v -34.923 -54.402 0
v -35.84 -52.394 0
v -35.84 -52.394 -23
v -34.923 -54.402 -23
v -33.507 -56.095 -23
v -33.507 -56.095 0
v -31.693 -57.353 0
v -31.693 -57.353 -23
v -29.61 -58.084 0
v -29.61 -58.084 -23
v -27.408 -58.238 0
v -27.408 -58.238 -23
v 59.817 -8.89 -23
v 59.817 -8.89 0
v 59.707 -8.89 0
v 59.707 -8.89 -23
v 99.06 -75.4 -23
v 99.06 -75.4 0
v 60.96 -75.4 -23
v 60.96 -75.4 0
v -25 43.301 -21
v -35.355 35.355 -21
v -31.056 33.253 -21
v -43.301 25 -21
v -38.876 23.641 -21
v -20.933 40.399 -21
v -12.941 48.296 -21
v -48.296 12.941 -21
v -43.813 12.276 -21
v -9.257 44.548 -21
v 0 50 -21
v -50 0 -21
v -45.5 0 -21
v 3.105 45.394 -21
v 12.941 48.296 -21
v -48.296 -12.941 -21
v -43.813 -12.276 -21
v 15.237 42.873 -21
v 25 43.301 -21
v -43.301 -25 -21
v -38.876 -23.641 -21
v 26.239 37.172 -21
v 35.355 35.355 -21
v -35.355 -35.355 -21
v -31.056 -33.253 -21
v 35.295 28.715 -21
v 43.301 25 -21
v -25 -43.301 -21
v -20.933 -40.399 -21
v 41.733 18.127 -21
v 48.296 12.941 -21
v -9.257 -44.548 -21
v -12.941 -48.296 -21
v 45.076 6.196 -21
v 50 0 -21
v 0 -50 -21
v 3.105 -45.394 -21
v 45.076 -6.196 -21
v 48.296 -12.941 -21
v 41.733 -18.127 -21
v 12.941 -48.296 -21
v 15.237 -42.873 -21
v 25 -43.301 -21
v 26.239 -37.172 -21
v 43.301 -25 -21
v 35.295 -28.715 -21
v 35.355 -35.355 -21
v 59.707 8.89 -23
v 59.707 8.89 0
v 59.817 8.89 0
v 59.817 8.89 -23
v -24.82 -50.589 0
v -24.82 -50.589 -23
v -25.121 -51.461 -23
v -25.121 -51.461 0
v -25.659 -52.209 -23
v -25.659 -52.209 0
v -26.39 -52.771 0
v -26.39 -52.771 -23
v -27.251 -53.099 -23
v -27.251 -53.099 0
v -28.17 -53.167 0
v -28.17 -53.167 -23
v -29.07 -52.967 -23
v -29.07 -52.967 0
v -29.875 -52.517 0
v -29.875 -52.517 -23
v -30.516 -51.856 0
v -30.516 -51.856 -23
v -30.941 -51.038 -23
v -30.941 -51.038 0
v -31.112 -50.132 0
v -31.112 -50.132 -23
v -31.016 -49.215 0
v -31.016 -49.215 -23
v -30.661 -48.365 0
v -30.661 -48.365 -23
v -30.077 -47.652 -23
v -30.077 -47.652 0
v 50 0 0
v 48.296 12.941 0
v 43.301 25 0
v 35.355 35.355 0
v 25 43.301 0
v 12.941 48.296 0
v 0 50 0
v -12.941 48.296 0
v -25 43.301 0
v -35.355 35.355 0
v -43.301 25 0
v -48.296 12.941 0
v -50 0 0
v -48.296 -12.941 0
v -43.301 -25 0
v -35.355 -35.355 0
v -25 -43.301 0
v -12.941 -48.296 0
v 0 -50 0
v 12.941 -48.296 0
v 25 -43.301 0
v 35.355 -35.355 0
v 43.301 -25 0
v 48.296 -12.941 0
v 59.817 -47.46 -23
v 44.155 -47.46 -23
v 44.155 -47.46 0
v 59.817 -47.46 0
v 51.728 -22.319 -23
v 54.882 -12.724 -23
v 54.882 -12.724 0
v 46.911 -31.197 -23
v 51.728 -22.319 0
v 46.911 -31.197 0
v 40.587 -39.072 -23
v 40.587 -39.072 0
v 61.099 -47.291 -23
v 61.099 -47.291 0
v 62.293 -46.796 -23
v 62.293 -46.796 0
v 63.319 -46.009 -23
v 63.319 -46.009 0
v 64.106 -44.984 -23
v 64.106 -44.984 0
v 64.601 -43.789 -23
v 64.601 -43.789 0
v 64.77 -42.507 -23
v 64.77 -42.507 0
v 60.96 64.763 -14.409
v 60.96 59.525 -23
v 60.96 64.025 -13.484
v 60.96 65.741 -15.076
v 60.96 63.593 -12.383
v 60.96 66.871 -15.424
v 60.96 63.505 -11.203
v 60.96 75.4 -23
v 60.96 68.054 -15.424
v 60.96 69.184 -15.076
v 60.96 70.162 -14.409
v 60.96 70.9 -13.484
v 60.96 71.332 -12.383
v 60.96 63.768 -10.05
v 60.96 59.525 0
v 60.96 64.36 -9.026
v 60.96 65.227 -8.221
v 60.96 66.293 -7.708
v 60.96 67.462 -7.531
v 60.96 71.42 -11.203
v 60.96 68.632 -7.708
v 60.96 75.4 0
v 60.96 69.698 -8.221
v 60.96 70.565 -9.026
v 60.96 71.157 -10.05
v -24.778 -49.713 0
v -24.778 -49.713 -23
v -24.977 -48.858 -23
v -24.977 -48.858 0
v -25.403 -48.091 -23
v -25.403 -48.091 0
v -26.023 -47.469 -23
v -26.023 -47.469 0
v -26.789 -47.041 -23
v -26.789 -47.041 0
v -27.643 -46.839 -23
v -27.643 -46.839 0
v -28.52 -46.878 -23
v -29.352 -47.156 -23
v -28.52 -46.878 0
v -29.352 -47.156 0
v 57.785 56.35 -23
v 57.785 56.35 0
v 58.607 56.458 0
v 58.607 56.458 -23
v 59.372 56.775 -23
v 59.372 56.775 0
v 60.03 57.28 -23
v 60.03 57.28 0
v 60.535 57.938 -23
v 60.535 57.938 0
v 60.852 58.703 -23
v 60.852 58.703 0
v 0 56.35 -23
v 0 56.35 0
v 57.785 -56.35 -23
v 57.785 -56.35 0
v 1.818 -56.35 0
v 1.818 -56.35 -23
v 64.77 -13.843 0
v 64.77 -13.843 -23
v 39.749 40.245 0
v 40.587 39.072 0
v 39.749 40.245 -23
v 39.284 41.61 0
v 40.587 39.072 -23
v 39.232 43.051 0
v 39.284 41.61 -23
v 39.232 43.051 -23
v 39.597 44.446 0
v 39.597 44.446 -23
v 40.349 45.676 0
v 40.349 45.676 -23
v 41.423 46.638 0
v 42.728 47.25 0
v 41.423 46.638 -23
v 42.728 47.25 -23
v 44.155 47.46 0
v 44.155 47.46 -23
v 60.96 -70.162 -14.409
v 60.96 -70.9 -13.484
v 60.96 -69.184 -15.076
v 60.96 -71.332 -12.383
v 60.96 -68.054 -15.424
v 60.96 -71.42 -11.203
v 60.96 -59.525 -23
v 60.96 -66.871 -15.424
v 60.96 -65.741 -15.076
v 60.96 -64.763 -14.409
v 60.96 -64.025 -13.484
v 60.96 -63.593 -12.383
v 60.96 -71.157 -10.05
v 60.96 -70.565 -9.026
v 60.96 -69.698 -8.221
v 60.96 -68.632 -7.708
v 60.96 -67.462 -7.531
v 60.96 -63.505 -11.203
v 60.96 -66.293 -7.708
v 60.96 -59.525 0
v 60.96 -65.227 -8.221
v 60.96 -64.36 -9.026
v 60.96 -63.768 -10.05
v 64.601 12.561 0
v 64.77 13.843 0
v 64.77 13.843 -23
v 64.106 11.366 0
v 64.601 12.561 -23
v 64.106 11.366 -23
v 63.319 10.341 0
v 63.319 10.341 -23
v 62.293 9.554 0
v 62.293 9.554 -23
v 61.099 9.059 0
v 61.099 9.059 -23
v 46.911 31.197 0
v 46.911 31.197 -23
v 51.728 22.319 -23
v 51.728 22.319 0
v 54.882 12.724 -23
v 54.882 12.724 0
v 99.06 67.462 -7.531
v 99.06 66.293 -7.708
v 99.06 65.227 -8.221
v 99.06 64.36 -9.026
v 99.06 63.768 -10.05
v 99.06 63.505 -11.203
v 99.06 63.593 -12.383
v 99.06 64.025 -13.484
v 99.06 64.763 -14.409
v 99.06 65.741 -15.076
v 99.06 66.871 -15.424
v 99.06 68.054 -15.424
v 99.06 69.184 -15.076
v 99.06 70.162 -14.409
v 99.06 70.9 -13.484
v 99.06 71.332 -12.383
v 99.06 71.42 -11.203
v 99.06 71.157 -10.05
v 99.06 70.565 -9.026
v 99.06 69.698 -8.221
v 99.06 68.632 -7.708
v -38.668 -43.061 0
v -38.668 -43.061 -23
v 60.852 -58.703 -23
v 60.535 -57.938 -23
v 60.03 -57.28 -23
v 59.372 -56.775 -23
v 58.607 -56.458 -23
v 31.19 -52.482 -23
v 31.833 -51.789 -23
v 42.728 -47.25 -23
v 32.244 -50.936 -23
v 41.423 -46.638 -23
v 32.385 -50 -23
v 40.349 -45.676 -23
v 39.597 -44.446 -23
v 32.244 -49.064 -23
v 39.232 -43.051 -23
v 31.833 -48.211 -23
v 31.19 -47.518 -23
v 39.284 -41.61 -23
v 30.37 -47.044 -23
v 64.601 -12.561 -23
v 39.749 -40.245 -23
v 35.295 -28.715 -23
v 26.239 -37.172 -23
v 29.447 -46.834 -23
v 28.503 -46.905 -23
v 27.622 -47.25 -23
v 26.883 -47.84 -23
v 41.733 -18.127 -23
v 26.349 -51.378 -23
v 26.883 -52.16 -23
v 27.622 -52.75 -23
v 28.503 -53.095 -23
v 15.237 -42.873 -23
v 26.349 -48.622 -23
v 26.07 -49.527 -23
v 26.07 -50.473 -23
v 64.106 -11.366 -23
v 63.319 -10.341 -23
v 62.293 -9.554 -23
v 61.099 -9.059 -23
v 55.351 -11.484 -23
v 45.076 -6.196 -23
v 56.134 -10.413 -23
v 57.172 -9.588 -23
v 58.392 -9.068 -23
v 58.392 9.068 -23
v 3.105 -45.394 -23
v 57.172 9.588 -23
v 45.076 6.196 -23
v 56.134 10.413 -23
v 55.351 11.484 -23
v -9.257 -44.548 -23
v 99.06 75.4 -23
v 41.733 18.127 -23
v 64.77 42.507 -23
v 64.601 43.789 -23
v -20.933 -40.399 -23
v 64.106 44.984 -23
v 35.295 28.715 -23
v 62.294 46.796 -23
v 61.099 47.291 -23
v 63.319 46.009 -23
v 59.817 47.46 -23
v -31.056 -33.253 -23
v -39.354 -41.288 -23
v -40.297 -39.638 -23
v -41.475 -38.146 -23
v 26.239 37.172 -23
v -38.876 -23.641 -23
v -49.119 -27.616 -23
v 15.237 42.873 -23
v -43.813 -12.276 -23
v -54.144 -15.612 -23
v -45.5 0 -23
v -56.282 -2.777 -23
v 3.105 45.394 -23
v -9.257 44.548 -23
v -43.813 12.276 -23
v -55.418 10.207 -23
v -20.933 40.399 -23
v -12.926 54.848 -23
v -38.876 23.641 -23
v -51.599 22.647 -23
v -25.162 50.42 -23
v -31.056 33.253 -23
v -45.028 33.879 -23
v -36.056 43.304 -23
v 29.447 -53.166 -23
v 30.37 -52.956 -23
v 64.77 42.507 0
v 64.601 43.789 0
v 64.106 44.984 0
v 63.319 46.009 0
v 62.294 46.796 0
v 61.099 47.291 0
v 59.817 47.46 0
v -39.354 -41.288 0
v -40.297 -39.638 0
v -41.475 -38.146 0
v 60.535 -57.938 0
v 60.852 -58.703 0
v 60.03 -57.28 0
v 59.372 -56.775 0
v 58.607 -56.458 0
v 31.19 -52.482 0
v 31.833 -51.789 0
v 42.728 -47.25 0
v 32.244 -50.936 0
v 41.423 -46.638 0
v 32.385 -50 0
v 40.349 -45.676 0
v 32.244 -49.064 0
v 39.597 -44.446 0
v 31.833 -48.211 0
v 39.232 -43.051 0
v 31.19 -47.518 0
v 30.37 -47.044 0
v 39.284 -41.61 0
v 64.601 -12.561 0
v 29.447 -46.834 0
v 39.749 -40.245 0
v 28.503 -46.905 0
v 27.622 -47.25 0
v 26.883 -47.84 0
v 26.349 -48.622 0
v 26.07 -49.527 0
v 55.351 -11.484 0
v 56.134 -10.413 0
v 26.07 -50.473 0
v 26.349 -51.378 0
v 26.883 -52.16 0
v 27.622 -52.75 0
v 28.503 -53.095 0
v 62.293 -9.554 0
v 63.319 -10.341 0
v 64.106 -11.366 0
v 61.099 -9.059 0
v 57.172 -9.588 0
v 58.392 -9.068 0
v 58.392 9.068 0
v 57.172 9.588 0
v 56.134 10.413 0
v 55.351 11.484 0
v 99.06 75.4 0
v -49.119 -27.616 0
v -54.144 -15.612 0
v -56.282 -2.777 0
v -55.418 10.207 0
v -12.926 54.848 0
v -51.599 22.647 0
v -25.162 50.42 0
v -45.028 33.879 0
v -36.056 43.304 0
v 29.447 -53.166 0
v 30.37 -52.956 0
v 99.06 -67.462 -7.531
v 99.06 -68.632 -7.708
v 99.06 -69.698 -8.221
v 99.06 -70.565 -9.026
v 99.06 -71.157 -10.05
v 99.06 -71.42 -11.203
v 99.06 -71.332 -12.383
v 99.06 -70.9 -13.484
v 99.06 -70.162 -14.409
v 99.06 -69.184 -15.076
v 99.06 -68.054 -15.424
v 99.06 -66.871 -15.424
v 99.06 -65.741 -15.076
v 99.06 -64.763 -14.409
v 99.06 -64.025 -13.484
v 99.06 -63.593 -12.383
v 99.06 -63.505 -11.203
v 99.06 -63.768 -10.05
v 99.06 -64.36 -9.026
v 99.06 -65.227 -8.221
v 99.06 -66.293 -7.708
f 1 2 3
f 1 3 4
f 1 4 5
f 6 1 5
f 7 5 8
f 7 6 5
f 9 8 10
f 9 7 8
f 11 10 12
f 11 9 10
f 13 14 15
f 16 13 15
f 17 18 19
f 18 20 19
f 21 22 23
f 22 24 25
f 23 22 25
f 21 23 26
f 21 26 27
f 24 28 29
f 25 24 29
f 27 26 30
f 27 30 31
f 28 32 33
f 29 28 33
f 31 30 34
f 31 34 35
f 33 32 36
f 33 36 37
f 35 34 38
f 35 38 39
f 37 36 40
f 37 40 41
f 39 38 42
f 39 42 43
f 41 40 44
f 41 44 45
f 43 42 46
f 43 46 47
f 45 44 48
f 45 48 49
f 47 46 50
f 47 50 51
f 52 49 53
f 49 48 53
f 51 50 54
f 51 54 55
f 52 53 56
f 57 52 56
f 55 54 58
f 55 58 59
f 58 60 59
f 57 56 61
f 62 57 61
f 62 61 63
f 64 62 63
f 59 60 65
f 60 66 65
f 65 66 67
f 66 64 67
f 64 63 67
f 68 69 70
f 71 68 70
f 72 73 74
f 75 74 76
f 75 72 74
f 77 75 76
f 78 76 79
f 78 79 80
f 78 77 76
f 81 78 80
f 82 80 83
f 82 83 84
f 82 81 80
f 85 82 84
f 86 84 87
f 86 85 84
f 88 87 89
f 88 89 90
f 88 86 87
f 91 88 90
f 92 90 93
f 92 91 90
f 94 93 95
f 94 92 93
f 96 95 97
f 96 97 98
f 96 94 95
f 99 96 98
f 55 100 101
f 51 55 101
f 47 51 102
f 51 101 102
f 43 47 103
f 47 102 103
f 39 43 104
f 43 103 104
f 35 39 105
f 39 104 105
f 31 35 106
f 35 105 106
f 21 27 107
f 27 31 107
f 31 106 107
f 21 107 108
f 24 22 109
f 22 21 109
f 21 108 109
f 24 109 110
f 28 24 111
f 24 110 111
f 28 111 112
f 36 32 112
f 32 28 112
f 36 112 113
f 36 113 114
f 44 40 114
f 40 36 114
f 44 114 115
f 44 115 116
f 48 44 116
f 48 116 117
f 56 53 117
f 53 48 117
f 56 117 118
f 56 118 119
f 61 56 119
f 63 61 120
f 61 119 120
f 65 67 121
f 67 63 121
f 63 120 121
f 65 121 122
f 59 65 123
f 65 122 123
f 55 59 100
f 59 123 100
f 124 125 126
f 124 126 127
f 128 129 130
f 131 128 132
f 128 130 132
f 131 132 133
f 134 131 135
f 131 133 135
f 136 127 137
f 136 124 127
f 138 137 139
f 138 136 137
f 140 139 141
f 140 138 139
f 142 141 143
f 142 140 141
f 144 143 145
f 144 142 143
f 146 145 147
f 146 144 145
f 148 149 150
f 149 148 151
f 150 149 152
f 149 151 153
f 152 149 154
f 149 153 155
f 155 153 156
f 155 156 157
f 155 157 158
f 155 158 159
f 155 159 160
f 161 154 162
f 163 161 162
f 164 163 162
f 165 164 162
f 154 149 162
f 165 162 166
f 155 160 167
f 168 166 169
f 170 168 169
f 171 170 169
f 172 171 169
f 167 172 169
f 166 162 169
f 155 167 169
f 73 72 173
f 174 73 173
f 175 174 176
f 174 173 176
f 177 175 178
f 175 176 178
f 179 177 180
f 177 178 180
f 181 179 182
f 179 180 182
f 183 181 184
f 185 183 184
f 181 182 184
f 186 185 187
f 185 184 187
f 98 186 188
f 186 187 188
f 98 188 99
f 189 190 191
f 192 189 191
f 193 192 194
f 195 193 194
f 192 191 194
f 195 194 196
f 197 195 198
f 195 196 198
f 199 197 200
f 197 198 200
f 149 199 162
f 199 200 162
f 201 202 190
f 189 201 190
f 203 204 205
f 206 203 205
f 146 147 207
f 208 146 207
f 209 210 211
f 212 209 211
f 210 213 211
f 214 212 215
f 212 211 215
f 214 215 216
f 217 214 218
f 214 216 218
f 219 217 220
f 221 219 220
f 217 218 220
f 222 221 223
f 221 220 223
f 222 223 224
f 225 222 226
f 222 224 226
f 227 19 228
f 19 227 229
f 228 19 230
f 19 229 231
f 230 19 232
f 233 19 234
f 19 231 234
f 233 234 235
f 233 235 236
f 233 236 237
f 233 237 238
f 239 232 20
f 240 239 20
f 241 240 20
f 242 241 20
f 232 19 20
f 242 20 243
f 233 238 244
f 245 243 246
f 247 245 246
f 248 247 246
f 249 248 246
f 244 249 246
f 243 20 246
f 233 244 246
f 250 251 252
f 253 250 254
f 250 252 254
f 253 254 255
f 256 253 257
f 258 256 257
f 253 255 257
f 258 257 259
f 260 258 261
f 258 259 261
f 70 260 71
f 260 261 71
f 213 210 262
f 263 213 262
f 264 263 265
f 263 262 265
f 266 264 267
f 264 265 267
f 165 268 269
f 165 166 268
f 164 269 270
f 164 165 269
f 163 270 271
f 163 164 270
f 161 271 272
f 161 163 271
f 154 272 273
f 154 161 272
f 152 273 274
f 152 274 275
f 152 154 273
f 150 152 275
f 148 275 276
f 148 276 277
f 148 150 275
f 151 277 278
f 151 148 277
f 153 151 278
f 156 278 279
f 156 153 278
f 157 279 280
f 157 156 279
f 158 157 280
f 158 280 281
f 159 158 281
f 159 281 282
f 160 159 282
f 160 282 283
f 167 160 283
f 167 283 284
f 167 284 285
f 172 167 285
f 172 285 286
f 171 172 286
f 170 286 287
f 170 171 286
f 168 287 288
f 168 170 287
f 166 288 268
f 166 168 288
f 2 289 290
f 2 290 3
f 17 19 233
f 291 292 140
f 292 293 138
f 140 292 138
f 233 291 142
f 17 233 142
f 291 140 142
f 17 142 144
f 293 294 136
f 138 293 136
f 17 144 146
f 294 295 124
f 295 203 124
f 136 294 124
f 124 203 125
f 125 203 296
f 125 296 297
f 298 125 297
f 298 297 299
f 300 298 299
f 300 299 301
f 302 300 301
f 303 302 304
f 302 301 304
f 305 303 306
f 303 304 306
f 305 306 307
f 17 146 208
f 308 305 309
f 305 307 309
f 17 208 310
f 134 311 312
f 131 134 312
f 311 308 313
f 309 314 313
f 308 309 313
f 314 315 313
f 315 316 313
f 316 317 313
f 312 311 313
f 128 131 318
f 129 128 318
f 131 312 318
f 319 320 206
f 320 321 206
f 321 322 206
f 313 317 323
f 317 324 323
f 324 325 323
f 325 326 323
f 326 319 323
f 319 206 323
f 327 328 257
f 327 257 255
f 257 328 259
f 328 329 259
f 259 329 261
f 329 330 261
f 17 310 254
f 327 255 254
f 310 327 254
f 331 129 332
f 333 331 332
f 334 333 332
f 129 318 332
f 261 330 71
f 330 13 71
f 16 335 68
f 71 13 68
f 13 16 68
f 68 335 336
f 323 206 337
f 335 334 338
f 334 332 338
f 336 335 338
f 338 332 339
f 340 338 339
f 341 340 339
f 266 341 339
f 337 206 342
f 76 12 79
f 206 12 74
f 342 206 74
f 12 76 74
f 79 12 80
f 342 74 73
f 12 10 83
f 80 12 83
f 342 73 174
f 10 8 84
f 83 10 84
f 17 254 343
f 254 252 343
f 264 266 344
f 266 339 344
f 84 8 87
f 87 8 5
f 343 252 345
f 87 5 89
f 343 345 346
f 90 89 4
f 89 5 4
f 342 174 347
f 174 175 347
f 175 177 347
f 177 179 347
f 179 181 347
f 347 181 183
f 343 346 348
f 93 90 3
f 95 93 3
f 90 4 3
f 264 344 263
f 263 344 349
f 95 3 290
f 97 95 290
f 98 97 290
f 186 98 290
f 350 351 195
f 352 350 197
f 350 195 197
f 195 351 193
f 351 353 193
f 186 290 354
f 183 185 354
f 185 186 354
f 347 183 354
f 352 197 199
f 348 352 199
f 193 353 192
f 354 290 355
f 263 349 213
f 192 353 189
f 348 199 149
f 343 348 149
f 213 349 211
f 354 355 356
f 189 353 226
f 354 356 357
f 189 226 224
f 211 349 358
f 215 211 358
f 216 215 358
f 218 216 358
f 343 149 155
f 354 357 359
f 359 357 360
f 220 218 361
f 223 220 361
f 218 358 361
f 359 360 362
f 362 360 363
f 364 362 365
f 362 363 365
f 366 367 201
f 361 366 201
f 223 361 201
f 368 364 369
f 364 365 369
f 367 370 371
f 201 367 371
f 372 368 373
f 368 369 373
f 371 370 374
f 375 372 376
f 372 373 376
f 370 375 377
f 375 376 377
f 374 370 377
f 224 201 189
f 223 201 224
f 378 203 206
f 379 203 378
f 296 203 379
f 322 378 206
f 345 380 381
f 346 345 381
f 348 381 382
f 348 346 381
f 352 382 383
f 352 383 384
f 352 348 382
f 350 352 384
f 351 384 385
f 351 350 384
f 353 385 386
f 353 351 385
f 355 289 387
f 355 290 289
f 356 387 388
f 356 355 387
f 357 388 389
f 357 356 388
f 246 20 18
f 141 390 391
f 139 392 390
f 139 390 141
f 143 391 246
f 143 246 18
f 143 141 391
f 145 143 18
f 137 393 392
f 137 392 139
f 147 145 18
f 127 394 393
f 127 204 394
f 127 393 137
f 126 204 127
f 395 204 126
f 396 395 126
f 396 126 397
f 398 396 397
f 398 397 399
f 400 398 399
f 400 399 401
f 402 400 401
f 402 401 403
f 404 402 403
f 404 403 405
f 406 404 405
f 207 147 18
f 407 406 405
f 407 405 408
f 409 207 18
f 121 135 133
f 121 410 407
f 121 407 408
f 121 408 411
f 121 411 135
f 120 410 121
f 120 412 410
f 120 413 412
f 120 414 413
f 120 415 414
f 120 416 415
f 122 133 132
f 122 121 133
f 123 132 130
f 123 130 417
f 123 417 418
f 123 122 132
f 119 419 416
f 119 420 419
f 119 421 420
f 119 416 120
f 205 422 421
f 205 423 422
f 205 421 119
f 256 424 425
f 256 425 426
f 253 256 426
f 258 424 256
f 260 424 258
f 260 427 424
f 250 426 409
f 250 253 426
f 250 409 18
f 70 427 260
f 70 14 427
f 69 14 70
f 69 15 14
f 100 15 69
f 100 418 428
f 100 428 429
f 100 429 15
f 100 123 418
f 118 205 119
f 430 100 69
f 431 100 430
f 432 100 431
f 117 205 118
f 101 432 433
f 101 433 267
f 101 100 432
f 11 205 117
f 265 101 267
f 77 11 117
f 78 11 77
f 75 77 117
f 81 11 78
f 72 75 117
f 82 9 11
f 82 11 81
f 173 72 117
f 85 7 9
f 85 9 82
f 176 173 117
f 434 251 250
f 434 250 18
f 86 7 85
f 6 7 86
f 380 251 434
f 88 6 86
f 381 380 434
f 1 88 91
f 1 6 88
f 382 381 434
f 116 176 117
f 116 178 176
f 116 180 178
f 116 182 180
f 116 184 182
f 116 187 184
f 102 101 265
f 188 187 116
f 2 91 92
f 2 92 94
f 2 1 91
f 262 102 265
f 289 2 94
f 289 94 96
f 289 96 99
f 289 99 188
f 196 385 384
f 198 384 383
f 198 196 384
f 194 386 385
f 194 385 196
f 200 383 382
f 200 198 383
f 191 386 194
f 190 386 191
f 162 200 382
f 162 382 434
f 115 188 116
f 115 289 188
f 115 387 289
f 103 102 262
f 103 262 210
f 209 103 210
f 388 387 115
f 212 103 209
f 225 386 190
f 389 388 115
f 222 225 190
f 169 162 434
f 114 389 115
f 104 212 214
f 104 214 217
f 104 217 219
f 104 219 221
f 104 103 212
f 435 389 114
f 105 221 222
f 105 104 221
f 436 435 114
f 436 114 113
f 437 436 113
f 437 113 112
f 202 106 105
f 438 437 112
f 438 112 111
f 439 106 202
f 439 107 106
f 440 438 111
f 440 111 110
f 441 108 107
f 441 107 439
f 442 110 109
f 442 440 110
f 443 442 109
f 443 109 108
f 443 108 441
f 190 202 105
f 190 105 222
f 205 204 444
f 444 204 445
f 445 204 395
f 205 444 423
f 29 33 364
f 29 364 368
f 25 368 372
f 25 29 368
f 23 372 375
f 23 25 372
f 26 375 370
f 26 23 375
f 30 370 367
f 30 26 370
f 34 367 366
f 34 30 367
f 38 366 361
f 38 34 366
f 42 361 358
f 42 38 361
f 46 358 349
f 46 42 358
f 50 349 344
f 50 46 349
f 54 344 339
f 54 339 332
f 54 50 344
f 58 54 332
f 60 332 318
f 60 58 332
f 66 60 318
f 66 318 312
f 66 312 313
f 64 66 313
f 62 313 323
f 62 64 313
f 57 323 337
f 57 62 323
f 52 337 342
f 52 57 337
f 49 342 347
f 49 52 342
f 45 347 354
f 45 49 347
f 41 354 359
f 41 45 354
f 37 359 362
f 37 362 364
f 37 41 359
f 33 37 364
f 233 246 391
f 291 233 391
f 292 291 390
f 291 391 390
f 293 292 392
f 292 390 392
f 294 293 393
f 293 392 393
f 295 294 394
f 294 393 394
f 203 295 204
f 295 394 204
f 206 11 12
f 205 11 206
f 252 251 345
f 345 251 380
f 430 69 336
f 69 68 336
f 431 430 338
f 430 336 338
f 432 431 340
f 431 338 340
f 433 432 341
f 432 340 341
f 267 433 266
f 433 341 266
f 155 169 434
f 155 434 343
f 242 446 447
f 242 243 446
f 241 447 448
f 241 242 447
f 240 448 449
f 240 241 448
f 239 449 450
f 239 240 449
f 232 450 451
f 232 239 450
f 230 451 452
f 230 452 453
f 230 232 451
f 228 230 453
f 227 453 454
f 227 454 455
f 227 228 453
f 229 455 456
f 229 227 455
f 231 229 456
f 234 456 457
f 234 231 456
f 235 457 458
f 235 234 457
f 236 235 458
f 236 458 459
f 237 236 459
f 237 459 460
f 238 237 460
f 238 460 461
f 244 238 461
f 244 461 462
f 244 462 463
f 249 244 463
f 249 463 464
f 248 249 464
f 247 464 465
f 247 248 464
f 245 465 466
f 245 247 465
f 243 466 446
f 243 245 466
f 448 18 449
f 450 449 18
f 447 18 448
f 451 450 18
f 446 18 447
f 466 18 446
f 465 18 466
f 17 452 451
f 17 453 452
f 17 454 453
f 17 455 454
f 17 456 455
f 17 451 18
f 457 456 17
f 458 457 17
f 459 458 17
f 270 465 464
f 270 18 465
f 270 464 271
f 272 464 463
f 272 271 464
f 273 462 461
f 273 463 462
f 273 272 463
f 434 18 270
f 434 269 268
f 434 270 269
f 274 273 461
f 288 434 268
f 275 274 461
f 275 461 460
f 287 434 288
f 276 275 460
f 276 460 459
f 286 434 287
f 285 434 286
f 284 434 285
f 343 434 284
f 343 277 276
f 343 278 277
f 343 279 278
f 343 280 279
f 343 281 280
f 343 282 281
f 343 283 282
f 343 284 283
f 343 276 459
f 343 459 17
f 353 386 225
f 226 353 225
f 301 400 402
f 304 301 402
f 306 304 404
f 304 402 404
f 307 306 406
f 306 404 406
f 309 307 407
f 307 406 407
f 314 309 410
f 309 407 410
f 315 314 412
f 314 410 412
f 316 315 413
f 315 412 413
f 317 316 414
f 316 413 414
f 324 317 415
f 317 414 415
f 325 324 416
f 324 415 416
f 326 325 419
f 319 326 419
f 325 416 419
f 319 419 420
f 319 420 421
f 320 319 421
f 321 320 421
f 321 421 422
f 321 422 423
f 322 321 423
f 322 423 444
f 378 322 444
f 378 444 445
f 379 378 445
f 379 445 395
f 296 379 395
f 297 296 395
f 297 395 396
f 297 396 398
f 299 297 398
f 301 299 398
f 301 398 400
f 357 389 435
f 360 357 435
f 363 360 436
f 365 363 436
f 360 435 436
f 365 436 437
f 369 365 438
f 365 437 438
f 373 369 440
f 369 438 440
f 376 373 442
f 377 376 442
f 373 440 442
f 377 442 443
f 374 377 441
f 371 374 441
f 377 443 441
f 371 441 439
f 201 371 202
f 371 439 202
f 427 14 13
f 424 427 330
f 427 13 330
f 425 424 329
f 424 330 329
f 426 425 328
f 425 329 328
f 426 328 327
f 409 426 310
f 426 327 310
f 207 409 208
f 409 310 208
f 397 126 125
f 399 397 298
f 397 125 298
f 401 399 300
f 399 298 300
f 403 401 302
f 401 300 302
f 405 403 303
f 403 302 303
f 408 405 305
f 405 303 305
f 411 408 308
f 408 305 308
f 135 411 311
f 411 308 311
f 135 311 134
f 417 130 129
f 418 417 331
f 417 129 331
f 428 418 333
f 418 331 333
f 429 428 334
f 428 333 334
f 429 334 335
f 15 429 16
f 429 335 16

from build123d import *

# Parameters (mm, degrees)
SKETCH1_R           = 50
BOSS_EXTRUDE1_DEPTH = 23
SKETCH2_R           = 3.96875
CUT_EXTRUDE1_DEPTH  = 23
BOSS_EXTRUDE2_START = -2
SKETCH3_R           = 50
SKETCH3_R_2         = 45.5
BOSS_EXTRUDE2_DEPTH = 2
CUT_EXTRUDE2_DEPTH  = 108.888625907
FILLET1_R           = 4.953
SKETCH6_R           = 3.175
CUT_EXTRUDE4_DEPTH  = 30.48
BOSS_EXTRUDE4_DEPTH = 23
FILLET2_R           = 12.7
SKETCH9_W           = 23
SKETCH9_H           = 150.8
SKETCH9_R           = 3.96875
BOSS_EXTRUDE5_DEPTH = 25.4


with BuildPart() as part:
    # Sketch1 → Boss-Extrude1 (new body)
    with BuildSketch(Plane.XY):
        with BuildLine():
            Line((73.66, 75.4), (73.66, -75.4))
            Line((73.66, -75.4), (60.96, -75.4))
            Line((60.96, -75.4), (60.96, -59.525))
            ThreePointArc((60.96, -59.525), (60.03006403, -57.27993597), (57.785, -56.35))
            Line((57.785, -56.35), (0, -56.35))
            ThreePointArc((0, -56.35), (-56.35, 0), (0, 56.35))
            Line((0, 56.35), (57.785, 56.35))
            ThreePointArc((57.785, 56.35), (60.03006403, 57.27993597), (60.96, 59.525))
            Line((60.96, 59.525), (60.96, 75.4))
            Line((60.96, 75.4), (73.66, 75.4))
        make_face()
        Circle(SKETCH1_R, mode=Mode.SUBTRACT)
    extrude(amount=-BOSS_EXTRUDE1_DEPTH)

    # Sketch2 → Cut-Extrude1 (cut)
    with BuildSketch(Plane.ZY.offset(-60.96)):
        with Locations((-11.5, 67.4625)):
            Circle(SKETCH2_R)
        with Locations((-11.5, -67.4625)):
            Circle(SKETCH2_R)
    extrude(amount=-CUT_EXTRUDE1_DEPTH, mode=Mode.SUBTRACT)

    # Sketch3 → Boss-Extrude2 (add)
    with BuildSketch(Plane(origin=(0, 0, -23), x_dir=(-1, 0, 0), z_dir=(0, 0, -1)).offset(BOSS_EXTRUDE2_START)):
        with Locations(Location((0, 0, 0), (0, 0, 180))):
            Circle(SKETCH3_R)
        Circle(SKETCH3_R_2, mode=Mode.SUBTRACT)
    extrude(amount=BOSS_EXTRUDE2_DEPTH)

    # Sketch4 → Cut-Extrude2 (cut, through all)
    with BuildSketch(Plane.XY):
        with BuildLine():
            Line((64.77, 8.89), (64.77, 47.46))
            Line((64.77, 47.46), (30.355226425, 47.46))
            ThreePointArc((30.355226425, 47.46), (47.120470693, 30.879647228), (55.631459367, 8.89))
            Line((55.631459367, 8.89), (64.77, 8.89))
        make_face()
        with BuildLine():
            Line((30.355226425, -47.46), (64.77, -47.46))
            Line((64.77, -47.46), (64.77, -8.89))
            Line((64.77, -8.89), (55.631459367, -8.89))
            ThreePointArc((55.631459367, -8.89), (47.120470693, -30.879647228), (30.355226425, -47.46))
        make_face()
    extrude(amount=-CUT_EXTRUDE2_DEPTH, mode=Mode.SUBTRACT)

    # Fillet1
    fillet1_edges = [part.edges().sort_by_distance(p)[0] for p in [
        (30.355226425, -47.46, -11.5),
        (55.631459367, -8.89, -11.5),
        (64.77, -8.89, -11.5),
        (64.77, -47.46, -11.5),
        (55.631459367, 8.89, -11.5),
        (30.355226425, 47.46, -11.5),
        (64.77, 47.46, -11.5),
        (64.77, 8.89, -11.5),
    ]]
    fillet(fillet1_edges, radius=FILLET1_R)

    # Sketch6 → Cut-Extrude4 (cut)
    with BuildSketch(Plane.XY):
        with Locations((-27.94, -50)):
            Circle(SKETCH6_R)
        with Locations((29.21, -50)):
            Circle(SKETCH6_R)
    extrude(amount=-CUT_EXTRUDE4_DEPTH, mode=Mode.SUBTRACT)

    # Sketch8 → Boss-Extrude4 (add)
    with BuildSketch(Plane.XY):
        with BuildLine():
            Line((-39.555189909, -40.133644879), (-35.840291724, -52.393828665))
            ThreePointArc((-35.840291724, -52.393828665), (-32.642189928, -56.784868082), (-27.407882123, -58.23783197))
            Line((-27.407882123, -58.23783197), (3.632324942, -56.232808177))
            ThreePointArc((3.632324942, -56.232808177), (-10.963276805, -55.273221922), (-24.82017584, -50.58934049))
            ThreePointArc((-24.82017584, -50.58934049), (-29.488783115, -52.771623326), (-30.076991341, -47.651831989))
            ThreePointArc((-30.076991341, -47.651831989), (-35.018437298, -44.147837424), (-39.555189909, -40.133644879))
        make_face()
    extrude(amount=-BOSS_EXTRUDE4_DEPTH)

    # Fillet2
    fillet2_edges = [part.edges().sort_by_distance(p)[0] for p in [
        (-39.555189909, -40.133644879, -11.5),
    ]]
    fillet(fillet2_edges, radius=FILLET2_R)

    # Sketch9 → Boss-Extrude5 (add)
    with BuildSketch(Plane(origin=(73.66, 0, 0), x_dir=(0, 0, -1), z_dir=(1, 0, 0))):
        with Locations((11.5, 0)):
            Rectangle(SKETCH9_W, SKETCH9_H)
        with Locations(Location((11.5, 67.4625, 0), (0, 0, 180))):
            Circle(SKETCH9_R, mode=Mode.SUBTRACT)
        with Locations(Location((11.5, -67.4625, 0), (0, 0, 180))):
            Circle(SKETCH9_R, mode=Mode.SUBTRACT)
    extrude(amount=BOSS_EXTRUDE5_DEPTH)


solid = part.part
